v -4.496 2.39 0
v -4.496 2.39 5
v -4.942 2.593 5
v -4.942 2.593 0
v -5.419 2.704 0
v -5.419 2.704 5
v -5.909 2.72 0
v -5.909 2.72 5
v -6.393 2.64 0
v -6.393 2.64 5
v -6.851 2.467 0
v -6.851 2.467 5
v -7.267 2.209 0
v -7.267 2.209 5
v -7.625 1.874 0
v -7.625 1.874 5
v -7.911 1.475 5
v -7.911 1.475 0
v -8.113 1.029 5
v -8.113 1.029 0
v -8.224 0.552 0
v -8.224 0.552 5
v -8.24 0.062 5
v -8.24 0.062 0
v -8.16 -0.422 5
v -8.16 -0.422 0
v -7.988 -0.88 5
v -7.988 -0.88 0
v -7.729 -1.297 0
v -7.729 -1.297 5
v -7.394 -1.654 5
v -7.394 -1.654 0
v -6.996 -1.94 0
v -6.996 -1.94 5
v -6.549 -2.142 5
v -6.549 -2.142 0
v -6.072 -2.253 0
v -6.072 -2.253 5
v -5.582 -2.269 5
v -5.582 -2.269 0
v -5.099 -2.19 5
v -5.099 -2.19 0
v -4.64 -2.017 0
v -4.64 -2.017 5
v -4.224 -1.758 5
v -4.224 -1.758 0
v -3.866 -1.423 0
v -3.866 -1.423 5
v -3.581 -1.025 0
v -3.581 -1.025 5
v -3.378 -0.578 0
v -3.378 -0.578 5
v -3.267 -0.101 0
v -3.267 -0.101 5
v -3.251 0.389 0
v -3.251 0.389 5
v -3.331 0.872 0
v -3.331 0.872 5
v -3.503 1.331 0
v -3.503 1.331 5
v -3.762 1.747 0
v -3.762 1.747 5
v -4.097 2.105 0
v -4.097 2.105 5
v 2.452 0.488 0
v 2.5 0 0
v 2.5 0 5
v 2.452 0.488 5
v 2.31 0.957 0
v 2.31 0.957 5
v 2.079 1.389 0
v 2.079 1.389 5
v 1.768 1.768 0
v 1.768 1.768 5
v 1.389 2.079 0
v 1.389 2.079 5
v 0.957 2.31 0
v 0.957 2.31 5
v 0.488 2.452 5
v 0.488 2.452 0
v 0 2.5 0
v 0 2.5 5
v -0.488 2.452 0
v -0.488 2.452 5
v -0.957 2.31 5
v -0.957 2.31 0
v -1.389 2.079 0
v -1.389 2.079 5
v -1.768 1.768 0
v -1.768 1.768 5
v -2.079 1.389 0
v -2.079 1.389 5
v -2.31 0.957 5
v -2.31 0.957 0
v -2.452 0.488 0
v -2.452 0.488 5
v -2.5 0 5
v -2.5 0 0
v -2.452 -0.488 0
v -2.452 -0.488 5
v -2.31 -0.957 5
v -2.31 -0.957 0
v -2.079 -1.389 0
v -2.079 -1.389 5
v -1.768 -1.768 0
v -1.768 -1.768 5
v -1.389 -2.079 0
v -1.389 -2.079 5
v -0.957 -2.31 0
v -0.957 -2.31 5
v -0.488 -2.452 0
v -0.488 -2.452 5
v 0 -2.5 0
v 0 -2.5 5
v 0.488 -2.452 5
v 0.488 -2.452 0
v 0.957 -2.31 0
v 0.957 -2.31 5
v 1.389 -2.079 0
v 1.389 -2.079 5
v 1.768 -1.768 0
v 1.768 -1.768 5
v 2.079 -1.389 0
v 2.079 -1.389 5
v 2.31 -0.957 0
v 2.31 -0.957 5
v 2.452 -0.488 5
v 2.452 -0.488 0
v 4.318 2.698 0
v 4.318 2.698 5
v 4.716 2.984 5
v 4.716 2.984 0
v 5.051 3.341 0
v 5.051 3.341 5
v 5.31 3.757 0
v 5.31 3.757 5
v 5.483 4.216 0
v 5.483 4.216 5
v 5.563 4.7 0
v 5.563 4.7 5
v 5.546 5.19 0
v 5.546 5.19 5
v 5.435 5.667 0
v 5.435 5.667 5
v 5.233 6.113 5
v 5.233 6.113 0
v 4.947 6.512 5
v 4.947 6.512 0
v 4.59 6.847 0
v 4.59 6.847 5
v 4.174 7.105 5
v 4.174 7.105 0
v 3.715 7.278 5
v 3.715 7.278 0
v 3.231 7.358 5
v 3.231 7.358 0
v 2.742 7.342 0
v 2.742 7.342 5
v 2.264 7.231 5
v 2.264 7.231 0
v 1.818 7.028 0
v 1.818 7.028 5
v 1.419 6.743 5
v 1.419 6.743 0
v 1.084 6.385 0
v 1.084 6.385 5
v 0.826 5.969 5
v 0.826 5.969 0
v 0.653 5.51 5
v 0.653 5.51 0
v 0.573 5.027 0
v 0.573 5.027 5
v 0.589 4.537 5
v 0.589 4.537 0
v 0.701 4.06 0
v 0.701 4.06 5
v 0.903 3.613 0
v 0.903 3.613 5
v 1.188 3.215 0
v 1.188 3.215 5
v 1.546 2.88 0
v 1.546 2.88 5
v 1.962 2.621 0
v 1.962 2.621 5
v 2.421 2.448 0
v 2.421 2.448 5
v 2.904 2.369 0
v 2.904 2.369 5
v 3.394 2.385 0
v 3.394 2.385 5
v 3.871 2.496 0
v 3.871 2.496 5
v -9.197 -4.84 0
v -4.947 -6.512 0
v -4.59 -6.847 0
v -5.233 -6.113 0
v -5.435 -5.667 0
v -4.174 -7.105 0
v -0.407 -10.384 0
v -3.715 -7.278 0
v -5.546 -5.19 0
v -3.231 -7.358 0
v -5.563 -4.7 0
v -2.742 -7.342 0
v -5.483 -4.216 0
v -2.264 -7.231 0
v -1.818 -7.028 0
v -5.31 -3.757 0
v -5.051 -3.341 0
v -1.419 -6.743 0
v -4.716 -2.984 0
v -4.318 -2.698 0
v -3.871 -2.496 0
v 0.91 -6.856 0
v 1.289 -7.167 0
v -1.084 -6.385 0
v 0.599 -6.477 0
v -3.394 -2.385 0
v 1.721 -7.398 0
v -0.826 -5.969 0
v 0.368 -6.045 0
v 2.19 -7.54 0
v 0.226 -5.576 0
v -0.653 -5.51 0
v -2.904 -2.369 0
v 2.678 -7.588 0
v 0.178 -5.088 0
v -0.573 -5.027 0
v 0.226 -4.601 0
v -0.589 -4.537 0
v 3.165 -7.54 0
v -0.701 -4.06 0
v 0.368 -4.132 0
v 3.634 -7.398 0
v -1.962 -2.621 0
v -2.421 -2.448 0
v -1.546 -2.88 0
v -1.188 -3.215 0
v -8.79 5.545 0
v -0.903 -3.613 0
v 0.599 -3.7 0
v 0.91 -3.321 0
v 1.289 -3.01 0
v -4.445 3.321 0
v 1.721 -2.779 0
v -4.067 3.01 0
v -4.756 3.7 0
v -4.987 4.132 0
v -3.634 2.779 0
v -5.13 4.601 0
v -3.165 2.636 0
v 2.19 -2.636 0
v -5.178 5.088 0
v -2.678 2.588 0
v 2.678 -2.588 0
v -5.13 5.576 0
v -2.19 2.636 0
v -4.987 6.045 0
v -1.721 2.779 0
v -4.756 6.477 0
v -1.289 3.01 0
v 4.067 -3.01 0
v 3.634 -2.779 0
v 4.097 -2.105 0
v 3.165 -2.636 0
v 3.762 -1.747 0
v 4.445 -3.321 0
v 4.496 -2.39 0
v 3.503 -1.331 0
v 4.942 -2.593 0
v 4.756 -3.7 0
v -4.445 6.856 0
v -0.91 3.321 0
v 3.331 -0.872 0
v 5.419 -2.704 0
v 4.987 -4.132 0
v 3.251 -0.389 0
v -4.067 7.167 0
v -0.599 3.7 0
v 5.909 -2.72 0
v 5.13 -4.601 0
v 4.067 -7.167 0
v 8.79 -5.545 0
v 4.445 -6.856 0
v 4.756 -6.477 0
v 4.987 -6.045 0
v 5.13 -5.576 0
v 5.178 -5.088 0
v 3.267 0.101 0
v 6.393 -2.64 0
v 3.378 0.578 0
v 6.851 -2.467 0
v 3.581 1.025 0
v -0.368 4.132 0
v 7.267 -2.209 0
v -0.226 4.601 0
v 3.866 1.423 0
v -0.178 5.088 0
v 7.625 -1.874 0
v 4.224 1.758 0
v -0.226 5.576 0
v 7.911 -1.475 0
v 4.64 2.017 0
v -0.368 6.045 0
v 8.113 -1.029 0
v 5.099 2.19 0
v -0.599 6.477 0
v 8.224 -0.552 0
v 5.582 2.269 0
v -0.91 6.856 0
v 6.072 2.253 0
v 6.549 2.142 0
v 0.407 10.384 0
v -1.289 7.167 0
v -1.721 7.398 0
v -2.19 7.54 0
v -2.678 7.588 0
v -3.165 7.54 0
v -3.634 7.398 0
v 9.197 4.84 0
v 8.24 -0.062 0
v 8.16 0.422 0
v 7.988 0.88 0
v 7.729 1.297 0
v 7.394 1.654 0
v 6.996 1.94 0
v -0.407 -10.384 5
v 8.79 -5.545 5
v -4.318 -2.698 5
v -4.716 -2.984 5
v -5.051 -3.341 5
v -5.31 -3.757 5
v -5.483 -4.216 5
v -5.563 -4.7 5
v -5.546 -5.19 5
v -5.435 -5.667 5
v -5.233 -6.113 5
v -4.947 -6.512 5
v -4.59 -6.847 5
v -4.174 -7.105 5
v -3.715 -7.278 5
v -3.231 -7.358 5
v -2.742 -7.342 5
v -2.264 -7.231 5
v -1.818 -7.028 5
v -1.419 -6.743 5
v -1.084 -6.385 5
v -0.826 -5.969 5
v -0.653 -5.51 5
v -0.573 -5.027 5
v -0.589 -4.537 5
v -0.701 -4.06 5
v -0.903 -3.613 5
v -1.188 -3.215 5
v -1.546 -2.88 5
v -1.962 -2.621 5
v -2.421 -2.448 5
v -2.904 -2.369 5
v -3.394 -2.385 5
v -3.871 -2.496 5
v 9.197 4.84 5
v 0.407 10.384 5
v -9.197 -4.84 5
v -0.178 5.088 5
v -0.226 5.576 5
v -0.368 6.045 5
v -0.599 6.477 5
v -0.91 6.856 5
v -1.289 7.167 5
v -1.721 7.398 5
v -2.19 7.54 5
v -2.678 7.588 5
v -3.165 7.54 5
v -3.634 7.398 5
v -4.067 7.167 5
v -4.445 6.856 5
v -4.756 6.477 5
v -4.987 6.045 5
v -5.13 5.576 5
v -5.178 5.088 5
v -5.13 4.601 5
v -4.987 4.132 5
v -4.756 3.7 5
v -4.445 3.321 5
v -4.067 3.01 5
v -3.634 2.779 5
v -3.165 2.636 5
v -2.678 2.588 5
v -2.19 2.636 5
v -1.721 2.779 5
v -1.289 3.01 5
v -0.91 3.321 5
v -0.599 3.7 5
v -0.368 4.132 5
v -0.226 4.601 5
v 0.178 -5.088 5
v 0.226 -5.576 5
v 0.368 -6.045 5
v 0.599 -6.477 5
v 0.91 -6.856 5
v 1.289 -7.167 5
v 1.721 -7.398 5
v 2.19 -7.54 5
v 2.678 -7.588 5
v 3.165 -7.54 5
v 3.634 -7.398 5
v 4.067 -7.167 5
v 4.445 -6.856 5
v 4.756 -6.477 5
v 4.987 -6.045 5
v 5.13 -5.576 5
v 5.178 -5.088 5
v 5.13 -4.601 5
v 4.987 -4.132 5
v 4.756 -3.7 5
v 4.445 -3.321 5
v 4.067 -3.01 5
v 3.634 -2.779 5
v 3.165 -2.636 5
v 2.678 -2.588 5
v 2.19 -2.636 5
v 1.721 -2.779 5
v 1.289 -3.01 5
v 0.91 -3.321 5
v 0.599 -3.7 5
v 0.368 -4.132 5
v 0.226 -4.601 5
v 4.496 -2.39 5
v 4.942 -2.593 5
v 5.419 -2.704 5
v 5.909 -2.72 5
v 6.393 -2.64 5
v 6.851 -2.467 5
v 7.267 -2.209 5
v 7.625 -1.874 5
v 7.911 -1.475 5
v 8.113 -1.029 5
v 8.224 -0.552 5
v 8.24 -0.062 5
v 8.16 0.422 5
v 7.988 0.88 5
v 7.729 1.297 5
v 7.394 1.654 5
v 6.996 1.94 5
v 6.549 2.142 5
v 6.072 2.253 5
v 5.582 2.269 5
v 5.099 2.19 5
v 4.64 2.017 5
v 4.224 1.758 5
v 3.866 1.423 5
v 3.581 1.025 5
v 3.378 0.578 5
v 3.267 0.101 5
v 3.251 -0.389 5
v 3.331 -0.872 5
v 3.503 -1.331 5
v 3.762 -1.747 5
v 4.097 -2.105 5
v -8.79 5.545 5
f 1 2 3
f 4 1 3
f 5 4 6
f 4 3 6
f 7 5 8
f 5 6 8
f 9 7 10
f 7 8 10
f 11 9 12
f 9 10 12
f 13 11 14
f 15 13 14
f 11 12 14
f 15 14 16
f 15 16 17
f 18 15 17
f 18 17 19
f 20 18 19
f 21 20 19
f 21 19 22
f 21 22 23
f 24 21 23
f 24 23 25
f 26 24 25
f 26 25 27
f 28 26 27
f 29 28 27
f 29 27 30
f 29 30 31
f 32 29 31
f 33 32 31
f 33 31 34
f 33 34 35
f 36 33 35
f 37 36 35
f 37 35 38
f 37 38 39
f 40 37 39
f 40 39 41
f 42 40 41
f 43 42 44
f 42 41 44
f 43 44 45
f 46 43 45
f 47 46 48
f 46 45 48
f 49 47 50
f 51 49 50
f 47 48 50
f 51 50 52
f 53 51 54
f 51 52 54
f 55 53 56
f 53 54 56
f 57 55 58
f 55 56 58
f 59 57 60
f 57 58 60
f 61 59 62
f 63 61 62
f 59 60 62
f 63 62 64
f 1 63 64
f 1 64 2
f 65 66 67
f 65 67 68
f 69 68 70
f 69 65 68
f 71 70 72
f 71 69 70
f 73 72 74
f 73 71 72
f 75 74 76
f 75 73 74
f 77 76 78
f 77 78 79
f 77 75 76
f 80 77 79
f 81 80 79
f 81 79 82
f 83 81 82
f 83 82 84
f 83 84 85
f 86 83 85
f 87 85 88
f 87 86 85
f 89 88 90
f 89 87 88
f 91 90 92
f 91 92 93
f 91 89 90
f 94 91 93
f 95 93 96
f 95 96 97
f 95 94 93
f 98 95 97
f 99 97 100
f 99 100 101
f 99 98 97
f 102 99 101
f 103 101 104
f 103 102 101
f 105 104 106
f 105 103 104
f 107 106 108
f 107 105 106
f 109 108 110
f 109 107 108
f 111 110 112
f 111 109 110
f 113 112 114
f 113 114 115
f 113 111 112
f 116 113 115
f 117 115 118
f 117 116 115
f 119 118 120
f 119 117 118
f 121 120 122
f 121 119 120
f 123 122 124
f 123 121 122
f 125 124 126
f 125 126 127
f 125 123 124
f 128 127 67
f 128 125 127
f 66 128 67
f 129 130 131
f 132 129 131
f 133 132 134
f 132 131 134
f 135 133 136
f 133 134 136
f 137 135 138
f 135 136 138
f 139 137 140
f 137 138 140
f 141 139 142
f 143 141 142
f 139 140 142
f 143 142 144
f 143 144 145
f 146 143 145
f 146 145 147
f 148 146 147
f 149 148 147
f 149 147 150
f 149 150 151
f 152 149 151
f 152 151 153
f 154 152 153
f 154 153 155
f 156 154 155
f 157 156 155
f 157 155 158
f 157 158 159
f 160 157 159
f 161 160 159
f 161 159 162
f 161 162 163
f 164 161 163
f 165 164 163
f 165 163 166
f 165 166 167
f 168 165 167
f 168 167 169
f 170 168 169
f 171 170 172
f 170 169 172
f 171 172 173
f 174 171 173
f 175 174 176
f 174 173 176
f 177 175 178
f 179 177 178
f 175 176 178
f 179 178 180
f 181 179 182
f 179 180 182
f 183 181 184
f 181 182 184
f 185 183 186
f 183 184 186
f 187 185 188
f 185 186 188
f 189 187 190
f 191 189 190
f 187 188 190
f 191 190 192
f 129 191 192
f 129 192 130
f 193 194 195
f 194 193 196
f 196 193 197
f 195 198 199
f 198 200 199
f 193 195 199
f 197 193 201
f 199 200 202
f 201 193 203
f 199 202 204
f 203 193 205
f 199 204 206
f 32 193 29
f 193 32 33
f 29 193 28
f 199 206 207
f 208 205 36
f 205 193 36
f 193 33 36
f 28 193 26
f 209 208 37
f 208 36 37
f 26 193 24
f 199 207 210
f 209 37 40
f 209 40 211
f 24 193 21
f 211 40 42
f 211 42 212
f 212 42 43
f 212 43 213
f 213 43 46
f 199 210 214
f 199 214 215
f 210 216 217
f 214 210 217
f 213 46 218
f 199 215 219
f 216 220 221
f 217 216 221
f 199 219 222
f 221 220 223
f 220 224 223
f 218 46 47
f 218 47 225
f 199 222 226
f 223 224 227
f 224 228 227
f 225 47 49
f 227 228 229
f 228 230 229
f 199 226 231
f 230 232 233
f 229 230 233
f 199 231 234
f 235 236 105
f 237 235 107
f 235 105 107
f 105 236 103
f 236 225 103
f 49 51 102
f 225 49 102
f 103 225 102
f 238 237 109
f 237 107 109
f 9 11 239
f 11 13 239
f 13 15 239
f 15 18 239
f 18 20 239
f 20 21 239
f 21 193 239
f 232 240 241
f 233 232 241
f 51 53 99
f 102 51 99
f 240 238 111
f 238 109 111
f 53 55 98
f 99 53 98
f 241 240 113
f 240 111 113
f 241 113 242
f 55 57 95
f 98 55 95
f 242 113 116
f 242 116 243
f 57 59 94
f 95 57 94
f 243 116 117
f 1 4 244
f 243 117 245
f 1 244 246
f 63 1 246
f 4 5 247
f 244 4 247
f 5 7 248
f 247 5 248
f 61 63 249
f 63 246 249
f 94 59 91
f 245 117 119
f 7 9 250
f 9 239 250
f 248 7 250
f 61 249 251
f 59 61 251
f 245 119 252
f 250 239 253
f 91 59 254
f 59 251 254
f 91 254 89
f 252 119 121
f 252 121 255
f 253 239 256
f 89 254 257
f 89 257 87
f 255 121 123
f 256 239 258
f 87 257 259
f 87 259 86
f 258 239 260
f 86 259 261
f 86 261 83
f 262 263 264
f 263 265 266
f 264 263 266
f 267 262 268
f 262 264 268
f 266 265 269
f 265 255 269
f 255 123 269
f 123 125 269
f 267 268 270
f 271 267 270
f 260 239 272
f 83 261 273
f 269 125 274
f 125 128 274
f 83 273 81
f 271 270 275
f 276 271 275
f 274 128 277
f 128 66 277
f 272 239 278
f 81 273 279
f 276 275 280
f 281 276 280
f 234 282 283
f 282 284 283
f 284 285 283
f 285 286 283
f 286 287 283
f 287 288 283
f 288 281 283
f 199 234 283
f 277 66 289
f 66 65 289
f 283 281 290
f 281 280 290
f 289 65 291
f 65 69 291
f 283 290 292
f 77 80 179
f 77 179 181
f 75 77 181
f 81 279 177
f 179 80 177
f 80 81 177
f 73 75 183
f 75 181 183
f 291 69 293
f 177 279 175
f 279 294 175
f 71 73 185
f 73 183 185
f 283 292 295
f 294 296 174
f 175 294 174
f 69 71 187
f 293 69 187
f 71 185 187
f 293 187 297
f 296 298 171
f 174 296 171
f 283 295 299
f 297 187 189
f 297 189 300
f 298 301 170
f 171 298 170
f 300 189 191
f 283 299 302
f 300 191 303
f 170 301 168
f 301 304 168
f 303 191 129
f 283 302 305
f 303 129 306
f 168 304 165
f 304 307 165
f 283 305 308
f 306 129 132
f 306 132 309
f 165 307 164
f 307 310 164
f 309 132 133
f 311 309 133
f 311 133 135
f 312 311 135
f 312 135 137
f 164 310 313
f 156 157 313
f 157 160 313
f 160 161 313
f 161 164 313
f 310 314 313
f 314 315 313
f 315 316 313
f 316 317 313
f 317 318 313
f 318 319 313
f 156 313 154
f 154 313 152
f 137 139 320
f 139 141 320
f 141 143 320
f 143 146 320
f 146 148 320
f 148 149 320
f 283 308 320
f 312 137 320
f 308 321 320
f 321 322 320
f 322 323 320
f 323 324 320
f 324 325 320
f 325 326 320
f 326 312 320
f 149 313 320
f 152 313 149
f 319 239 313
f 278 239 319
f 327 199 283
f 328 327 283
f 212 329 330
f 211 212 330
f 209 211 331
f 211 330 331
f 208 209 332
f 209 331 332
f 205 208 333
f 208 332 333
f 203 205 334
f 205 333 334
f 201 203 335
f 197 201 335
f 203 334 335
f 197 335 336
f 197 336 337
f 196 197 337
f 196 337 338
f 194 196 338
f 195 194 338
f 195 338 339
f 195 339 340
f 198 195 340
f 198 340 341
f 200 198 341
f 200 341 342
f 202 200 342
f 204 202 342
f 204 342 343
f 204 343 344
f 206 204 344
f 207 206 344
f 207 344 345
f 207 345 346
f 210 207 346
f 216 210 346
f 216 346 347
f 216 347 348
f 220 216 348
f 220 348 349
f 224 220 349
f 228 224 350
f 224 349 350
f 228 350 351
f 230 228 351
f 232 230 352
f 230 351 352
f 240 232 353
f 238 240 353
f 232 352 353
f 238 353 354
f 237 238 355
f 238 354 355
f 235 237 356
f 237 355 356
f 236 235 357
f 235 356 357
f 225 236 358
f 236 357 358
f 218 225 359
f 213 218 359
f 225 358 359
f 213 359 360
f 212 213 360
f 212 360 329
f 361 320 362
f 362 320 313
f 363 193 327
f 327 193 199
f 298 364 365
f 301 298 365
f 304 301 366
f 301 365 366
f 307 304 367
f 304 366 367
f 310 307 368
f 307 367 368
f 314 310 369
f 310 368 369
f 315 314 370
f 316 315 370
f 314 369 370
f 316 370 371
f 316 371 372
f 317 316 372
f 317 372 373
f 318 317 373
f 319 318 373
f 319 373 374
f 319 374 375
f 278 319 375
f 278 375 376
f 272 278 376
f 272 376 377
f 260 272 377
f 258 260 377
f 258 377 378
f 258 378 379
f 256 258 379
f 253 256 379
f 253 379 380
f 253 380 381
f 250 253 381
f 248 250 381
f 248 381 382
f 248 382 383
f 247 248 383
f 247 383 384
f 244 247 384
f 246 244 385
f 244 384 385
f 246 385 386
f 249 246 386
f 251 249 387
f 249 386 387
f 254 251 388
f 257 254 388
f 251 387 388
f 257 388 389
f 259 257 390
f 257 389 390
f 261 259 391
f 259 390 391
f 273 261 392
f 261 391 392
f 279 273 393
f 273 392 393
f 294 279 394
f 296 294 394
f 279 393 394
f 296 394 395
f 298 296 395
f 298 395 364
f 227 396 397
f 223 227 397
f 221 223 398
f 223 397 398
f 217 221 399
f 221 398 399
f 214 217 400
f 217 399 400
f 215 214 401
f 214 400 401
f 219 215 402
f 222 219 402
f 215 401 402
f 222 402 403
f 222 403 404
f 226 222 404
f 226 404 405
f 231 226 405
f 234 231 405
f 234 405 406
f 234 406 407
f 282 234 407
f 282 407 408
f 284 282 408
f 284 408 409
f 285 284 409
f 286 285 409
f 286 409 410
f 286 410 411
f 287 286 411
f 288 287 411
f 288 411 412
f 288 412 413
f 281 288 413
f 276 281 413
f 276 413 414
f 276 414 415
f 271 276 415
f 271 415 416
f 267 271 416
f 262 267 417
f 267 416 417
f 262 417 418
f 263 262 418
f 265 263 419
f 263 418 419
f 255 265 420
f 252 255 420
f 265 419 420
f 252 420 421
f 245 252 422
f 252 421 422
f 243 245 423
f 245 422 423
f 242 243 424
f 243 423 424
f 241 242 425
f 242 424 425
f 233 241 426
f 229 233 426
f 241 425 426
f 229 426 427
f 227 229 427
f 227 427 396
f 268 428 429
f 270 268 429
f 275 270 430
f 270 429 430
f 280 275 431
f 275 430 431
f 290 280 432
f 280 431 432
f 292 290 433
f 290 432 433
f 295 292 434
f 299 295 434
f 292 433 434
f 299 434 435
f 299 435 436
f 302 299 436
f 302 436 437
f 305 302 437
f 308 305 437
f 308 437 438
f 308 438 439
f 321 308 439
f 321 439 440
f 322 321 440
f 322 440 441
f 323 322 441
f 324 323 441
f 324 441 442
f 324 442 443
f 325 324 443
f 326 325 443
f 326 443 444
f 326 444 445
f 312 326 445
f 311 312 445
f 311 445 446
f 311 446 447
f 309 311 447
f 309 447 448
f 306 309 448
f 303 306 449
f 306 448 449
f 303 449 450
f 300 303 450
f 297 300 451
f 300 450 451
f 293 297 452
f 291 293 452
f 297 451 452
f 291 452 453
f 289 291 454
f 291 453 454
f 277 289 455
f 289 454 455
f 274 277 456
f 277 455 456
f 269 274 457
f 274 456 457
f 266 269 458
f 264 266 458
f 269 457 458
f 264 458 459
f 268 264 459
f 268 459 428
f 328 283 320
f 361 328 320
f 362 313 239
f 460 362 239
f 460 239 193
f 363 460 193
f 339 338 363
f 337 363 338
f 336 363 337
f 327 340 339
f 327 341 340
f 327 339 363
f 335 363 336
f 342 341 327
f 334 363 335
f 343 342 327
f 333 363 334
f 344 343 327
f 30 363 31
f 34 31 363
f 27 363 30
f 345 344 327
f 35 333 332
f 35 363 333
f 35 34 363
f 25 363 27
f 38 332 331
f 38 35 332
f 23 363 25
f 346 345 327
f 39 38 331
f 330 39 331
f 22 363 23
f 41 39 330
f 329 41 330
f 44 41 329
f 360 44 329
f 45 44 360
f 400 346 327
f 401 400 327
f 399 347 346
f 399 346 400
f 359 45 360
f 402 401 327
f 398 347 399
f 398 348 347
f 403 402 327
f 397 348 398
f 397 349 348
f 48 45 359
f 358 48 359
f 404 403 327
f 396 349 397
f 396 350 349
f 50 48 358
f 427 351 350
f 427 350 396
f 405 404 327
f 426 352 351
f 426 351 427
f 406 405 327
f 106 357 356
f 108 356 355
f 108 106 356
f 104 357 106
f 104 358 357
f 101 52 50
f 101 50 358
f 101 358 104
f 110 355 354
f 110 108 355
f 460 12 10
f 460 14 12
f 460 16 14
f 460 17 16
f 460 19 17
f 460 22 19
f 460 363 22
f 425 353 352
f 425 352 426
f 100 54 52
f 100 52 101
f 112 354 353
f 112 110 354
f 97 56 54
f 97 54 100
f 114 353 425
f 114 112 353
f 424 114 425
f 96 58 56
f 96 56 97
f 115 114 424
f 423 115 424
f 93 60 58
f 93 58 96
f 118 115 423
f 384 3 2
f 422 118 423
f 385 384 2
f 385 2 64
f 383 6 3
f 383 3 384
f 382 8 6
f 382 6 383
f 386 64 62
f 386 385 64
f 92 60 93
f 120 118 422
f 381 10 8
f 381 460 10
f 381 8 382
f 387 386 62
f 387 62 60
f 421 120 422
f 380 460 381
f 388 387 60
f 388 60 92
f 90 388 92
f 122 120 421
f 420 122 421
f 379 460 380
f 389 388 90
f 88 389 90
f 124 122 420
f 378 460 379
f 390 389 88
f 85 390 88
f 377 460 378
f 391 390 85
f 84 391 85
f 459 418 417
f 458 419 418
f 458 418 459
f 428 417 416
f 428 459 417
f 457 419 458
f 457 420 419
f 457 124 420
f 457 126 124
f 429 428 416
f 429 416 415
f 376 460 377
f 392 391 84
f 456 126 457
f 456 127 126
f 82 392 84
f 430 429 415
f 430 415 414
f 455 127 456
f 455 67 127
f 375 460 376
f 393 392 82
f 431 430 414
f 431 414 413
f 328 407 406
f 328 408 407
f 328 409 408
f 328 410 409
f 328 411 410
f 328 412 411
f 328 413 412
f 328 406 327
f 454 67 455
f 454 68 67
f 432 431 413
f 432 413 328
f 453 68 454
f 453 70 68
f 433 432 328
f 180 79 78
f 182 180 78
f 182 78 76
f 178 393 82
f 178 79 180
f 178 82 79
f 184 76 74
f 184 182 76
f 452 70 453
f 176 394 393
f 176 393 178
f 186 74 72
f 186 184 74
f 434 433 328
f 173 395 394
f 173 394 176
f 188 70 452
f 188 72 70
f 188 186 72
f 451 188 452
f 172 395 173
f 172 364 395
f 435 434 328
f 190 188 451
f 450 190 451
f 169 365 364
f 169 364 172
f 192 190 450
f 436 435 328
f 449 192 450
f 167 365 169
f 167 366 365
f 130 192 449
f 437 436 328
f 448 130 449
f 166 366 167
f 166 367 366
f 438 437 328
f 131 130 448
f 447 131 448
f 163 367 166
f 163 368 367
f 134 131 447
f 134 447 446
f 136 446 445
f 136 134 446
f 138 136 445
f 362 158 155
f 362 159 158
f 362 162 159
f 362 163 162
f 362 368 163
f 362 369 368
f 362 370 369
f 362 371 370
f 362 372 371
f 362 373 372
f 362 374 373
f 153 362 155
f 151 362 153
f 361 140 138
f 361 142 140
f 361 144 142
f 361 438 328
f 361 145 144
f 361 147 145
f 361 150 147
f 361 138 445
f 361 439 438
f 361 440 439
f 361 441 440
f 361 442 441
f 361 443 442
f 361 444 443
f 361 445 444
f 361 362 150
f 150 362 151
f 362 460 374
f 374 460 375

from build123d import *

# Parameters (mm, degrees)
SKETCH1_R           = 2.5
BOSS_EXTRUDE1_DEPTH = 5
SKETCH2_R           = 2.5
CUT_EXTRUDE1_DEPTH  = 9
CIRPATTERN1_COUNT   = 6


with BuildPart() as part:
    # Sketch1 → Boss-Extrude1 (new body)
    with BuildSketch(Plane.XY):
        Polygon((-8.789542733, 5.544721683), (-9.196641201, -4.839606453), (-0.407098468, -10.384328136), (8.789542733, -5.544721683), (9.196641201, 4.839606453), (0.407098468, 10.384328136), align=None)
        Circle(SKETCH1_R, mode=Mode.SUBTRACT)
    extrude(amount=BOSS_EXTRUDE1_DEPTH)

    # Sketch2 → Cut-Extrude1 (cut)
    with BuildSketch(Plane.XY.offset(5)):
        with Locations((-2.677725251, 5.08844647)):
            Circle(SKETCH2_R)
    cut_extrude1 = extrude(amount=-CUT_EXTRUDE1_DEPTH, mode=Mode.SUBTRACT)

    # CirPattern1: Cut-Extrude1 ×6 about axis
    cirpattern1_axis = Axis((0, 0, 0), (0, 0, 1))
    for i in range(1, CIRPATTERN1_COUNT):
        add(cut_extrude1.rotate(cirpattern1_axis, i * 360 / CIRPATTERN1_COUNT), mode=Mode.SUBTRACT)


solid = part.part
